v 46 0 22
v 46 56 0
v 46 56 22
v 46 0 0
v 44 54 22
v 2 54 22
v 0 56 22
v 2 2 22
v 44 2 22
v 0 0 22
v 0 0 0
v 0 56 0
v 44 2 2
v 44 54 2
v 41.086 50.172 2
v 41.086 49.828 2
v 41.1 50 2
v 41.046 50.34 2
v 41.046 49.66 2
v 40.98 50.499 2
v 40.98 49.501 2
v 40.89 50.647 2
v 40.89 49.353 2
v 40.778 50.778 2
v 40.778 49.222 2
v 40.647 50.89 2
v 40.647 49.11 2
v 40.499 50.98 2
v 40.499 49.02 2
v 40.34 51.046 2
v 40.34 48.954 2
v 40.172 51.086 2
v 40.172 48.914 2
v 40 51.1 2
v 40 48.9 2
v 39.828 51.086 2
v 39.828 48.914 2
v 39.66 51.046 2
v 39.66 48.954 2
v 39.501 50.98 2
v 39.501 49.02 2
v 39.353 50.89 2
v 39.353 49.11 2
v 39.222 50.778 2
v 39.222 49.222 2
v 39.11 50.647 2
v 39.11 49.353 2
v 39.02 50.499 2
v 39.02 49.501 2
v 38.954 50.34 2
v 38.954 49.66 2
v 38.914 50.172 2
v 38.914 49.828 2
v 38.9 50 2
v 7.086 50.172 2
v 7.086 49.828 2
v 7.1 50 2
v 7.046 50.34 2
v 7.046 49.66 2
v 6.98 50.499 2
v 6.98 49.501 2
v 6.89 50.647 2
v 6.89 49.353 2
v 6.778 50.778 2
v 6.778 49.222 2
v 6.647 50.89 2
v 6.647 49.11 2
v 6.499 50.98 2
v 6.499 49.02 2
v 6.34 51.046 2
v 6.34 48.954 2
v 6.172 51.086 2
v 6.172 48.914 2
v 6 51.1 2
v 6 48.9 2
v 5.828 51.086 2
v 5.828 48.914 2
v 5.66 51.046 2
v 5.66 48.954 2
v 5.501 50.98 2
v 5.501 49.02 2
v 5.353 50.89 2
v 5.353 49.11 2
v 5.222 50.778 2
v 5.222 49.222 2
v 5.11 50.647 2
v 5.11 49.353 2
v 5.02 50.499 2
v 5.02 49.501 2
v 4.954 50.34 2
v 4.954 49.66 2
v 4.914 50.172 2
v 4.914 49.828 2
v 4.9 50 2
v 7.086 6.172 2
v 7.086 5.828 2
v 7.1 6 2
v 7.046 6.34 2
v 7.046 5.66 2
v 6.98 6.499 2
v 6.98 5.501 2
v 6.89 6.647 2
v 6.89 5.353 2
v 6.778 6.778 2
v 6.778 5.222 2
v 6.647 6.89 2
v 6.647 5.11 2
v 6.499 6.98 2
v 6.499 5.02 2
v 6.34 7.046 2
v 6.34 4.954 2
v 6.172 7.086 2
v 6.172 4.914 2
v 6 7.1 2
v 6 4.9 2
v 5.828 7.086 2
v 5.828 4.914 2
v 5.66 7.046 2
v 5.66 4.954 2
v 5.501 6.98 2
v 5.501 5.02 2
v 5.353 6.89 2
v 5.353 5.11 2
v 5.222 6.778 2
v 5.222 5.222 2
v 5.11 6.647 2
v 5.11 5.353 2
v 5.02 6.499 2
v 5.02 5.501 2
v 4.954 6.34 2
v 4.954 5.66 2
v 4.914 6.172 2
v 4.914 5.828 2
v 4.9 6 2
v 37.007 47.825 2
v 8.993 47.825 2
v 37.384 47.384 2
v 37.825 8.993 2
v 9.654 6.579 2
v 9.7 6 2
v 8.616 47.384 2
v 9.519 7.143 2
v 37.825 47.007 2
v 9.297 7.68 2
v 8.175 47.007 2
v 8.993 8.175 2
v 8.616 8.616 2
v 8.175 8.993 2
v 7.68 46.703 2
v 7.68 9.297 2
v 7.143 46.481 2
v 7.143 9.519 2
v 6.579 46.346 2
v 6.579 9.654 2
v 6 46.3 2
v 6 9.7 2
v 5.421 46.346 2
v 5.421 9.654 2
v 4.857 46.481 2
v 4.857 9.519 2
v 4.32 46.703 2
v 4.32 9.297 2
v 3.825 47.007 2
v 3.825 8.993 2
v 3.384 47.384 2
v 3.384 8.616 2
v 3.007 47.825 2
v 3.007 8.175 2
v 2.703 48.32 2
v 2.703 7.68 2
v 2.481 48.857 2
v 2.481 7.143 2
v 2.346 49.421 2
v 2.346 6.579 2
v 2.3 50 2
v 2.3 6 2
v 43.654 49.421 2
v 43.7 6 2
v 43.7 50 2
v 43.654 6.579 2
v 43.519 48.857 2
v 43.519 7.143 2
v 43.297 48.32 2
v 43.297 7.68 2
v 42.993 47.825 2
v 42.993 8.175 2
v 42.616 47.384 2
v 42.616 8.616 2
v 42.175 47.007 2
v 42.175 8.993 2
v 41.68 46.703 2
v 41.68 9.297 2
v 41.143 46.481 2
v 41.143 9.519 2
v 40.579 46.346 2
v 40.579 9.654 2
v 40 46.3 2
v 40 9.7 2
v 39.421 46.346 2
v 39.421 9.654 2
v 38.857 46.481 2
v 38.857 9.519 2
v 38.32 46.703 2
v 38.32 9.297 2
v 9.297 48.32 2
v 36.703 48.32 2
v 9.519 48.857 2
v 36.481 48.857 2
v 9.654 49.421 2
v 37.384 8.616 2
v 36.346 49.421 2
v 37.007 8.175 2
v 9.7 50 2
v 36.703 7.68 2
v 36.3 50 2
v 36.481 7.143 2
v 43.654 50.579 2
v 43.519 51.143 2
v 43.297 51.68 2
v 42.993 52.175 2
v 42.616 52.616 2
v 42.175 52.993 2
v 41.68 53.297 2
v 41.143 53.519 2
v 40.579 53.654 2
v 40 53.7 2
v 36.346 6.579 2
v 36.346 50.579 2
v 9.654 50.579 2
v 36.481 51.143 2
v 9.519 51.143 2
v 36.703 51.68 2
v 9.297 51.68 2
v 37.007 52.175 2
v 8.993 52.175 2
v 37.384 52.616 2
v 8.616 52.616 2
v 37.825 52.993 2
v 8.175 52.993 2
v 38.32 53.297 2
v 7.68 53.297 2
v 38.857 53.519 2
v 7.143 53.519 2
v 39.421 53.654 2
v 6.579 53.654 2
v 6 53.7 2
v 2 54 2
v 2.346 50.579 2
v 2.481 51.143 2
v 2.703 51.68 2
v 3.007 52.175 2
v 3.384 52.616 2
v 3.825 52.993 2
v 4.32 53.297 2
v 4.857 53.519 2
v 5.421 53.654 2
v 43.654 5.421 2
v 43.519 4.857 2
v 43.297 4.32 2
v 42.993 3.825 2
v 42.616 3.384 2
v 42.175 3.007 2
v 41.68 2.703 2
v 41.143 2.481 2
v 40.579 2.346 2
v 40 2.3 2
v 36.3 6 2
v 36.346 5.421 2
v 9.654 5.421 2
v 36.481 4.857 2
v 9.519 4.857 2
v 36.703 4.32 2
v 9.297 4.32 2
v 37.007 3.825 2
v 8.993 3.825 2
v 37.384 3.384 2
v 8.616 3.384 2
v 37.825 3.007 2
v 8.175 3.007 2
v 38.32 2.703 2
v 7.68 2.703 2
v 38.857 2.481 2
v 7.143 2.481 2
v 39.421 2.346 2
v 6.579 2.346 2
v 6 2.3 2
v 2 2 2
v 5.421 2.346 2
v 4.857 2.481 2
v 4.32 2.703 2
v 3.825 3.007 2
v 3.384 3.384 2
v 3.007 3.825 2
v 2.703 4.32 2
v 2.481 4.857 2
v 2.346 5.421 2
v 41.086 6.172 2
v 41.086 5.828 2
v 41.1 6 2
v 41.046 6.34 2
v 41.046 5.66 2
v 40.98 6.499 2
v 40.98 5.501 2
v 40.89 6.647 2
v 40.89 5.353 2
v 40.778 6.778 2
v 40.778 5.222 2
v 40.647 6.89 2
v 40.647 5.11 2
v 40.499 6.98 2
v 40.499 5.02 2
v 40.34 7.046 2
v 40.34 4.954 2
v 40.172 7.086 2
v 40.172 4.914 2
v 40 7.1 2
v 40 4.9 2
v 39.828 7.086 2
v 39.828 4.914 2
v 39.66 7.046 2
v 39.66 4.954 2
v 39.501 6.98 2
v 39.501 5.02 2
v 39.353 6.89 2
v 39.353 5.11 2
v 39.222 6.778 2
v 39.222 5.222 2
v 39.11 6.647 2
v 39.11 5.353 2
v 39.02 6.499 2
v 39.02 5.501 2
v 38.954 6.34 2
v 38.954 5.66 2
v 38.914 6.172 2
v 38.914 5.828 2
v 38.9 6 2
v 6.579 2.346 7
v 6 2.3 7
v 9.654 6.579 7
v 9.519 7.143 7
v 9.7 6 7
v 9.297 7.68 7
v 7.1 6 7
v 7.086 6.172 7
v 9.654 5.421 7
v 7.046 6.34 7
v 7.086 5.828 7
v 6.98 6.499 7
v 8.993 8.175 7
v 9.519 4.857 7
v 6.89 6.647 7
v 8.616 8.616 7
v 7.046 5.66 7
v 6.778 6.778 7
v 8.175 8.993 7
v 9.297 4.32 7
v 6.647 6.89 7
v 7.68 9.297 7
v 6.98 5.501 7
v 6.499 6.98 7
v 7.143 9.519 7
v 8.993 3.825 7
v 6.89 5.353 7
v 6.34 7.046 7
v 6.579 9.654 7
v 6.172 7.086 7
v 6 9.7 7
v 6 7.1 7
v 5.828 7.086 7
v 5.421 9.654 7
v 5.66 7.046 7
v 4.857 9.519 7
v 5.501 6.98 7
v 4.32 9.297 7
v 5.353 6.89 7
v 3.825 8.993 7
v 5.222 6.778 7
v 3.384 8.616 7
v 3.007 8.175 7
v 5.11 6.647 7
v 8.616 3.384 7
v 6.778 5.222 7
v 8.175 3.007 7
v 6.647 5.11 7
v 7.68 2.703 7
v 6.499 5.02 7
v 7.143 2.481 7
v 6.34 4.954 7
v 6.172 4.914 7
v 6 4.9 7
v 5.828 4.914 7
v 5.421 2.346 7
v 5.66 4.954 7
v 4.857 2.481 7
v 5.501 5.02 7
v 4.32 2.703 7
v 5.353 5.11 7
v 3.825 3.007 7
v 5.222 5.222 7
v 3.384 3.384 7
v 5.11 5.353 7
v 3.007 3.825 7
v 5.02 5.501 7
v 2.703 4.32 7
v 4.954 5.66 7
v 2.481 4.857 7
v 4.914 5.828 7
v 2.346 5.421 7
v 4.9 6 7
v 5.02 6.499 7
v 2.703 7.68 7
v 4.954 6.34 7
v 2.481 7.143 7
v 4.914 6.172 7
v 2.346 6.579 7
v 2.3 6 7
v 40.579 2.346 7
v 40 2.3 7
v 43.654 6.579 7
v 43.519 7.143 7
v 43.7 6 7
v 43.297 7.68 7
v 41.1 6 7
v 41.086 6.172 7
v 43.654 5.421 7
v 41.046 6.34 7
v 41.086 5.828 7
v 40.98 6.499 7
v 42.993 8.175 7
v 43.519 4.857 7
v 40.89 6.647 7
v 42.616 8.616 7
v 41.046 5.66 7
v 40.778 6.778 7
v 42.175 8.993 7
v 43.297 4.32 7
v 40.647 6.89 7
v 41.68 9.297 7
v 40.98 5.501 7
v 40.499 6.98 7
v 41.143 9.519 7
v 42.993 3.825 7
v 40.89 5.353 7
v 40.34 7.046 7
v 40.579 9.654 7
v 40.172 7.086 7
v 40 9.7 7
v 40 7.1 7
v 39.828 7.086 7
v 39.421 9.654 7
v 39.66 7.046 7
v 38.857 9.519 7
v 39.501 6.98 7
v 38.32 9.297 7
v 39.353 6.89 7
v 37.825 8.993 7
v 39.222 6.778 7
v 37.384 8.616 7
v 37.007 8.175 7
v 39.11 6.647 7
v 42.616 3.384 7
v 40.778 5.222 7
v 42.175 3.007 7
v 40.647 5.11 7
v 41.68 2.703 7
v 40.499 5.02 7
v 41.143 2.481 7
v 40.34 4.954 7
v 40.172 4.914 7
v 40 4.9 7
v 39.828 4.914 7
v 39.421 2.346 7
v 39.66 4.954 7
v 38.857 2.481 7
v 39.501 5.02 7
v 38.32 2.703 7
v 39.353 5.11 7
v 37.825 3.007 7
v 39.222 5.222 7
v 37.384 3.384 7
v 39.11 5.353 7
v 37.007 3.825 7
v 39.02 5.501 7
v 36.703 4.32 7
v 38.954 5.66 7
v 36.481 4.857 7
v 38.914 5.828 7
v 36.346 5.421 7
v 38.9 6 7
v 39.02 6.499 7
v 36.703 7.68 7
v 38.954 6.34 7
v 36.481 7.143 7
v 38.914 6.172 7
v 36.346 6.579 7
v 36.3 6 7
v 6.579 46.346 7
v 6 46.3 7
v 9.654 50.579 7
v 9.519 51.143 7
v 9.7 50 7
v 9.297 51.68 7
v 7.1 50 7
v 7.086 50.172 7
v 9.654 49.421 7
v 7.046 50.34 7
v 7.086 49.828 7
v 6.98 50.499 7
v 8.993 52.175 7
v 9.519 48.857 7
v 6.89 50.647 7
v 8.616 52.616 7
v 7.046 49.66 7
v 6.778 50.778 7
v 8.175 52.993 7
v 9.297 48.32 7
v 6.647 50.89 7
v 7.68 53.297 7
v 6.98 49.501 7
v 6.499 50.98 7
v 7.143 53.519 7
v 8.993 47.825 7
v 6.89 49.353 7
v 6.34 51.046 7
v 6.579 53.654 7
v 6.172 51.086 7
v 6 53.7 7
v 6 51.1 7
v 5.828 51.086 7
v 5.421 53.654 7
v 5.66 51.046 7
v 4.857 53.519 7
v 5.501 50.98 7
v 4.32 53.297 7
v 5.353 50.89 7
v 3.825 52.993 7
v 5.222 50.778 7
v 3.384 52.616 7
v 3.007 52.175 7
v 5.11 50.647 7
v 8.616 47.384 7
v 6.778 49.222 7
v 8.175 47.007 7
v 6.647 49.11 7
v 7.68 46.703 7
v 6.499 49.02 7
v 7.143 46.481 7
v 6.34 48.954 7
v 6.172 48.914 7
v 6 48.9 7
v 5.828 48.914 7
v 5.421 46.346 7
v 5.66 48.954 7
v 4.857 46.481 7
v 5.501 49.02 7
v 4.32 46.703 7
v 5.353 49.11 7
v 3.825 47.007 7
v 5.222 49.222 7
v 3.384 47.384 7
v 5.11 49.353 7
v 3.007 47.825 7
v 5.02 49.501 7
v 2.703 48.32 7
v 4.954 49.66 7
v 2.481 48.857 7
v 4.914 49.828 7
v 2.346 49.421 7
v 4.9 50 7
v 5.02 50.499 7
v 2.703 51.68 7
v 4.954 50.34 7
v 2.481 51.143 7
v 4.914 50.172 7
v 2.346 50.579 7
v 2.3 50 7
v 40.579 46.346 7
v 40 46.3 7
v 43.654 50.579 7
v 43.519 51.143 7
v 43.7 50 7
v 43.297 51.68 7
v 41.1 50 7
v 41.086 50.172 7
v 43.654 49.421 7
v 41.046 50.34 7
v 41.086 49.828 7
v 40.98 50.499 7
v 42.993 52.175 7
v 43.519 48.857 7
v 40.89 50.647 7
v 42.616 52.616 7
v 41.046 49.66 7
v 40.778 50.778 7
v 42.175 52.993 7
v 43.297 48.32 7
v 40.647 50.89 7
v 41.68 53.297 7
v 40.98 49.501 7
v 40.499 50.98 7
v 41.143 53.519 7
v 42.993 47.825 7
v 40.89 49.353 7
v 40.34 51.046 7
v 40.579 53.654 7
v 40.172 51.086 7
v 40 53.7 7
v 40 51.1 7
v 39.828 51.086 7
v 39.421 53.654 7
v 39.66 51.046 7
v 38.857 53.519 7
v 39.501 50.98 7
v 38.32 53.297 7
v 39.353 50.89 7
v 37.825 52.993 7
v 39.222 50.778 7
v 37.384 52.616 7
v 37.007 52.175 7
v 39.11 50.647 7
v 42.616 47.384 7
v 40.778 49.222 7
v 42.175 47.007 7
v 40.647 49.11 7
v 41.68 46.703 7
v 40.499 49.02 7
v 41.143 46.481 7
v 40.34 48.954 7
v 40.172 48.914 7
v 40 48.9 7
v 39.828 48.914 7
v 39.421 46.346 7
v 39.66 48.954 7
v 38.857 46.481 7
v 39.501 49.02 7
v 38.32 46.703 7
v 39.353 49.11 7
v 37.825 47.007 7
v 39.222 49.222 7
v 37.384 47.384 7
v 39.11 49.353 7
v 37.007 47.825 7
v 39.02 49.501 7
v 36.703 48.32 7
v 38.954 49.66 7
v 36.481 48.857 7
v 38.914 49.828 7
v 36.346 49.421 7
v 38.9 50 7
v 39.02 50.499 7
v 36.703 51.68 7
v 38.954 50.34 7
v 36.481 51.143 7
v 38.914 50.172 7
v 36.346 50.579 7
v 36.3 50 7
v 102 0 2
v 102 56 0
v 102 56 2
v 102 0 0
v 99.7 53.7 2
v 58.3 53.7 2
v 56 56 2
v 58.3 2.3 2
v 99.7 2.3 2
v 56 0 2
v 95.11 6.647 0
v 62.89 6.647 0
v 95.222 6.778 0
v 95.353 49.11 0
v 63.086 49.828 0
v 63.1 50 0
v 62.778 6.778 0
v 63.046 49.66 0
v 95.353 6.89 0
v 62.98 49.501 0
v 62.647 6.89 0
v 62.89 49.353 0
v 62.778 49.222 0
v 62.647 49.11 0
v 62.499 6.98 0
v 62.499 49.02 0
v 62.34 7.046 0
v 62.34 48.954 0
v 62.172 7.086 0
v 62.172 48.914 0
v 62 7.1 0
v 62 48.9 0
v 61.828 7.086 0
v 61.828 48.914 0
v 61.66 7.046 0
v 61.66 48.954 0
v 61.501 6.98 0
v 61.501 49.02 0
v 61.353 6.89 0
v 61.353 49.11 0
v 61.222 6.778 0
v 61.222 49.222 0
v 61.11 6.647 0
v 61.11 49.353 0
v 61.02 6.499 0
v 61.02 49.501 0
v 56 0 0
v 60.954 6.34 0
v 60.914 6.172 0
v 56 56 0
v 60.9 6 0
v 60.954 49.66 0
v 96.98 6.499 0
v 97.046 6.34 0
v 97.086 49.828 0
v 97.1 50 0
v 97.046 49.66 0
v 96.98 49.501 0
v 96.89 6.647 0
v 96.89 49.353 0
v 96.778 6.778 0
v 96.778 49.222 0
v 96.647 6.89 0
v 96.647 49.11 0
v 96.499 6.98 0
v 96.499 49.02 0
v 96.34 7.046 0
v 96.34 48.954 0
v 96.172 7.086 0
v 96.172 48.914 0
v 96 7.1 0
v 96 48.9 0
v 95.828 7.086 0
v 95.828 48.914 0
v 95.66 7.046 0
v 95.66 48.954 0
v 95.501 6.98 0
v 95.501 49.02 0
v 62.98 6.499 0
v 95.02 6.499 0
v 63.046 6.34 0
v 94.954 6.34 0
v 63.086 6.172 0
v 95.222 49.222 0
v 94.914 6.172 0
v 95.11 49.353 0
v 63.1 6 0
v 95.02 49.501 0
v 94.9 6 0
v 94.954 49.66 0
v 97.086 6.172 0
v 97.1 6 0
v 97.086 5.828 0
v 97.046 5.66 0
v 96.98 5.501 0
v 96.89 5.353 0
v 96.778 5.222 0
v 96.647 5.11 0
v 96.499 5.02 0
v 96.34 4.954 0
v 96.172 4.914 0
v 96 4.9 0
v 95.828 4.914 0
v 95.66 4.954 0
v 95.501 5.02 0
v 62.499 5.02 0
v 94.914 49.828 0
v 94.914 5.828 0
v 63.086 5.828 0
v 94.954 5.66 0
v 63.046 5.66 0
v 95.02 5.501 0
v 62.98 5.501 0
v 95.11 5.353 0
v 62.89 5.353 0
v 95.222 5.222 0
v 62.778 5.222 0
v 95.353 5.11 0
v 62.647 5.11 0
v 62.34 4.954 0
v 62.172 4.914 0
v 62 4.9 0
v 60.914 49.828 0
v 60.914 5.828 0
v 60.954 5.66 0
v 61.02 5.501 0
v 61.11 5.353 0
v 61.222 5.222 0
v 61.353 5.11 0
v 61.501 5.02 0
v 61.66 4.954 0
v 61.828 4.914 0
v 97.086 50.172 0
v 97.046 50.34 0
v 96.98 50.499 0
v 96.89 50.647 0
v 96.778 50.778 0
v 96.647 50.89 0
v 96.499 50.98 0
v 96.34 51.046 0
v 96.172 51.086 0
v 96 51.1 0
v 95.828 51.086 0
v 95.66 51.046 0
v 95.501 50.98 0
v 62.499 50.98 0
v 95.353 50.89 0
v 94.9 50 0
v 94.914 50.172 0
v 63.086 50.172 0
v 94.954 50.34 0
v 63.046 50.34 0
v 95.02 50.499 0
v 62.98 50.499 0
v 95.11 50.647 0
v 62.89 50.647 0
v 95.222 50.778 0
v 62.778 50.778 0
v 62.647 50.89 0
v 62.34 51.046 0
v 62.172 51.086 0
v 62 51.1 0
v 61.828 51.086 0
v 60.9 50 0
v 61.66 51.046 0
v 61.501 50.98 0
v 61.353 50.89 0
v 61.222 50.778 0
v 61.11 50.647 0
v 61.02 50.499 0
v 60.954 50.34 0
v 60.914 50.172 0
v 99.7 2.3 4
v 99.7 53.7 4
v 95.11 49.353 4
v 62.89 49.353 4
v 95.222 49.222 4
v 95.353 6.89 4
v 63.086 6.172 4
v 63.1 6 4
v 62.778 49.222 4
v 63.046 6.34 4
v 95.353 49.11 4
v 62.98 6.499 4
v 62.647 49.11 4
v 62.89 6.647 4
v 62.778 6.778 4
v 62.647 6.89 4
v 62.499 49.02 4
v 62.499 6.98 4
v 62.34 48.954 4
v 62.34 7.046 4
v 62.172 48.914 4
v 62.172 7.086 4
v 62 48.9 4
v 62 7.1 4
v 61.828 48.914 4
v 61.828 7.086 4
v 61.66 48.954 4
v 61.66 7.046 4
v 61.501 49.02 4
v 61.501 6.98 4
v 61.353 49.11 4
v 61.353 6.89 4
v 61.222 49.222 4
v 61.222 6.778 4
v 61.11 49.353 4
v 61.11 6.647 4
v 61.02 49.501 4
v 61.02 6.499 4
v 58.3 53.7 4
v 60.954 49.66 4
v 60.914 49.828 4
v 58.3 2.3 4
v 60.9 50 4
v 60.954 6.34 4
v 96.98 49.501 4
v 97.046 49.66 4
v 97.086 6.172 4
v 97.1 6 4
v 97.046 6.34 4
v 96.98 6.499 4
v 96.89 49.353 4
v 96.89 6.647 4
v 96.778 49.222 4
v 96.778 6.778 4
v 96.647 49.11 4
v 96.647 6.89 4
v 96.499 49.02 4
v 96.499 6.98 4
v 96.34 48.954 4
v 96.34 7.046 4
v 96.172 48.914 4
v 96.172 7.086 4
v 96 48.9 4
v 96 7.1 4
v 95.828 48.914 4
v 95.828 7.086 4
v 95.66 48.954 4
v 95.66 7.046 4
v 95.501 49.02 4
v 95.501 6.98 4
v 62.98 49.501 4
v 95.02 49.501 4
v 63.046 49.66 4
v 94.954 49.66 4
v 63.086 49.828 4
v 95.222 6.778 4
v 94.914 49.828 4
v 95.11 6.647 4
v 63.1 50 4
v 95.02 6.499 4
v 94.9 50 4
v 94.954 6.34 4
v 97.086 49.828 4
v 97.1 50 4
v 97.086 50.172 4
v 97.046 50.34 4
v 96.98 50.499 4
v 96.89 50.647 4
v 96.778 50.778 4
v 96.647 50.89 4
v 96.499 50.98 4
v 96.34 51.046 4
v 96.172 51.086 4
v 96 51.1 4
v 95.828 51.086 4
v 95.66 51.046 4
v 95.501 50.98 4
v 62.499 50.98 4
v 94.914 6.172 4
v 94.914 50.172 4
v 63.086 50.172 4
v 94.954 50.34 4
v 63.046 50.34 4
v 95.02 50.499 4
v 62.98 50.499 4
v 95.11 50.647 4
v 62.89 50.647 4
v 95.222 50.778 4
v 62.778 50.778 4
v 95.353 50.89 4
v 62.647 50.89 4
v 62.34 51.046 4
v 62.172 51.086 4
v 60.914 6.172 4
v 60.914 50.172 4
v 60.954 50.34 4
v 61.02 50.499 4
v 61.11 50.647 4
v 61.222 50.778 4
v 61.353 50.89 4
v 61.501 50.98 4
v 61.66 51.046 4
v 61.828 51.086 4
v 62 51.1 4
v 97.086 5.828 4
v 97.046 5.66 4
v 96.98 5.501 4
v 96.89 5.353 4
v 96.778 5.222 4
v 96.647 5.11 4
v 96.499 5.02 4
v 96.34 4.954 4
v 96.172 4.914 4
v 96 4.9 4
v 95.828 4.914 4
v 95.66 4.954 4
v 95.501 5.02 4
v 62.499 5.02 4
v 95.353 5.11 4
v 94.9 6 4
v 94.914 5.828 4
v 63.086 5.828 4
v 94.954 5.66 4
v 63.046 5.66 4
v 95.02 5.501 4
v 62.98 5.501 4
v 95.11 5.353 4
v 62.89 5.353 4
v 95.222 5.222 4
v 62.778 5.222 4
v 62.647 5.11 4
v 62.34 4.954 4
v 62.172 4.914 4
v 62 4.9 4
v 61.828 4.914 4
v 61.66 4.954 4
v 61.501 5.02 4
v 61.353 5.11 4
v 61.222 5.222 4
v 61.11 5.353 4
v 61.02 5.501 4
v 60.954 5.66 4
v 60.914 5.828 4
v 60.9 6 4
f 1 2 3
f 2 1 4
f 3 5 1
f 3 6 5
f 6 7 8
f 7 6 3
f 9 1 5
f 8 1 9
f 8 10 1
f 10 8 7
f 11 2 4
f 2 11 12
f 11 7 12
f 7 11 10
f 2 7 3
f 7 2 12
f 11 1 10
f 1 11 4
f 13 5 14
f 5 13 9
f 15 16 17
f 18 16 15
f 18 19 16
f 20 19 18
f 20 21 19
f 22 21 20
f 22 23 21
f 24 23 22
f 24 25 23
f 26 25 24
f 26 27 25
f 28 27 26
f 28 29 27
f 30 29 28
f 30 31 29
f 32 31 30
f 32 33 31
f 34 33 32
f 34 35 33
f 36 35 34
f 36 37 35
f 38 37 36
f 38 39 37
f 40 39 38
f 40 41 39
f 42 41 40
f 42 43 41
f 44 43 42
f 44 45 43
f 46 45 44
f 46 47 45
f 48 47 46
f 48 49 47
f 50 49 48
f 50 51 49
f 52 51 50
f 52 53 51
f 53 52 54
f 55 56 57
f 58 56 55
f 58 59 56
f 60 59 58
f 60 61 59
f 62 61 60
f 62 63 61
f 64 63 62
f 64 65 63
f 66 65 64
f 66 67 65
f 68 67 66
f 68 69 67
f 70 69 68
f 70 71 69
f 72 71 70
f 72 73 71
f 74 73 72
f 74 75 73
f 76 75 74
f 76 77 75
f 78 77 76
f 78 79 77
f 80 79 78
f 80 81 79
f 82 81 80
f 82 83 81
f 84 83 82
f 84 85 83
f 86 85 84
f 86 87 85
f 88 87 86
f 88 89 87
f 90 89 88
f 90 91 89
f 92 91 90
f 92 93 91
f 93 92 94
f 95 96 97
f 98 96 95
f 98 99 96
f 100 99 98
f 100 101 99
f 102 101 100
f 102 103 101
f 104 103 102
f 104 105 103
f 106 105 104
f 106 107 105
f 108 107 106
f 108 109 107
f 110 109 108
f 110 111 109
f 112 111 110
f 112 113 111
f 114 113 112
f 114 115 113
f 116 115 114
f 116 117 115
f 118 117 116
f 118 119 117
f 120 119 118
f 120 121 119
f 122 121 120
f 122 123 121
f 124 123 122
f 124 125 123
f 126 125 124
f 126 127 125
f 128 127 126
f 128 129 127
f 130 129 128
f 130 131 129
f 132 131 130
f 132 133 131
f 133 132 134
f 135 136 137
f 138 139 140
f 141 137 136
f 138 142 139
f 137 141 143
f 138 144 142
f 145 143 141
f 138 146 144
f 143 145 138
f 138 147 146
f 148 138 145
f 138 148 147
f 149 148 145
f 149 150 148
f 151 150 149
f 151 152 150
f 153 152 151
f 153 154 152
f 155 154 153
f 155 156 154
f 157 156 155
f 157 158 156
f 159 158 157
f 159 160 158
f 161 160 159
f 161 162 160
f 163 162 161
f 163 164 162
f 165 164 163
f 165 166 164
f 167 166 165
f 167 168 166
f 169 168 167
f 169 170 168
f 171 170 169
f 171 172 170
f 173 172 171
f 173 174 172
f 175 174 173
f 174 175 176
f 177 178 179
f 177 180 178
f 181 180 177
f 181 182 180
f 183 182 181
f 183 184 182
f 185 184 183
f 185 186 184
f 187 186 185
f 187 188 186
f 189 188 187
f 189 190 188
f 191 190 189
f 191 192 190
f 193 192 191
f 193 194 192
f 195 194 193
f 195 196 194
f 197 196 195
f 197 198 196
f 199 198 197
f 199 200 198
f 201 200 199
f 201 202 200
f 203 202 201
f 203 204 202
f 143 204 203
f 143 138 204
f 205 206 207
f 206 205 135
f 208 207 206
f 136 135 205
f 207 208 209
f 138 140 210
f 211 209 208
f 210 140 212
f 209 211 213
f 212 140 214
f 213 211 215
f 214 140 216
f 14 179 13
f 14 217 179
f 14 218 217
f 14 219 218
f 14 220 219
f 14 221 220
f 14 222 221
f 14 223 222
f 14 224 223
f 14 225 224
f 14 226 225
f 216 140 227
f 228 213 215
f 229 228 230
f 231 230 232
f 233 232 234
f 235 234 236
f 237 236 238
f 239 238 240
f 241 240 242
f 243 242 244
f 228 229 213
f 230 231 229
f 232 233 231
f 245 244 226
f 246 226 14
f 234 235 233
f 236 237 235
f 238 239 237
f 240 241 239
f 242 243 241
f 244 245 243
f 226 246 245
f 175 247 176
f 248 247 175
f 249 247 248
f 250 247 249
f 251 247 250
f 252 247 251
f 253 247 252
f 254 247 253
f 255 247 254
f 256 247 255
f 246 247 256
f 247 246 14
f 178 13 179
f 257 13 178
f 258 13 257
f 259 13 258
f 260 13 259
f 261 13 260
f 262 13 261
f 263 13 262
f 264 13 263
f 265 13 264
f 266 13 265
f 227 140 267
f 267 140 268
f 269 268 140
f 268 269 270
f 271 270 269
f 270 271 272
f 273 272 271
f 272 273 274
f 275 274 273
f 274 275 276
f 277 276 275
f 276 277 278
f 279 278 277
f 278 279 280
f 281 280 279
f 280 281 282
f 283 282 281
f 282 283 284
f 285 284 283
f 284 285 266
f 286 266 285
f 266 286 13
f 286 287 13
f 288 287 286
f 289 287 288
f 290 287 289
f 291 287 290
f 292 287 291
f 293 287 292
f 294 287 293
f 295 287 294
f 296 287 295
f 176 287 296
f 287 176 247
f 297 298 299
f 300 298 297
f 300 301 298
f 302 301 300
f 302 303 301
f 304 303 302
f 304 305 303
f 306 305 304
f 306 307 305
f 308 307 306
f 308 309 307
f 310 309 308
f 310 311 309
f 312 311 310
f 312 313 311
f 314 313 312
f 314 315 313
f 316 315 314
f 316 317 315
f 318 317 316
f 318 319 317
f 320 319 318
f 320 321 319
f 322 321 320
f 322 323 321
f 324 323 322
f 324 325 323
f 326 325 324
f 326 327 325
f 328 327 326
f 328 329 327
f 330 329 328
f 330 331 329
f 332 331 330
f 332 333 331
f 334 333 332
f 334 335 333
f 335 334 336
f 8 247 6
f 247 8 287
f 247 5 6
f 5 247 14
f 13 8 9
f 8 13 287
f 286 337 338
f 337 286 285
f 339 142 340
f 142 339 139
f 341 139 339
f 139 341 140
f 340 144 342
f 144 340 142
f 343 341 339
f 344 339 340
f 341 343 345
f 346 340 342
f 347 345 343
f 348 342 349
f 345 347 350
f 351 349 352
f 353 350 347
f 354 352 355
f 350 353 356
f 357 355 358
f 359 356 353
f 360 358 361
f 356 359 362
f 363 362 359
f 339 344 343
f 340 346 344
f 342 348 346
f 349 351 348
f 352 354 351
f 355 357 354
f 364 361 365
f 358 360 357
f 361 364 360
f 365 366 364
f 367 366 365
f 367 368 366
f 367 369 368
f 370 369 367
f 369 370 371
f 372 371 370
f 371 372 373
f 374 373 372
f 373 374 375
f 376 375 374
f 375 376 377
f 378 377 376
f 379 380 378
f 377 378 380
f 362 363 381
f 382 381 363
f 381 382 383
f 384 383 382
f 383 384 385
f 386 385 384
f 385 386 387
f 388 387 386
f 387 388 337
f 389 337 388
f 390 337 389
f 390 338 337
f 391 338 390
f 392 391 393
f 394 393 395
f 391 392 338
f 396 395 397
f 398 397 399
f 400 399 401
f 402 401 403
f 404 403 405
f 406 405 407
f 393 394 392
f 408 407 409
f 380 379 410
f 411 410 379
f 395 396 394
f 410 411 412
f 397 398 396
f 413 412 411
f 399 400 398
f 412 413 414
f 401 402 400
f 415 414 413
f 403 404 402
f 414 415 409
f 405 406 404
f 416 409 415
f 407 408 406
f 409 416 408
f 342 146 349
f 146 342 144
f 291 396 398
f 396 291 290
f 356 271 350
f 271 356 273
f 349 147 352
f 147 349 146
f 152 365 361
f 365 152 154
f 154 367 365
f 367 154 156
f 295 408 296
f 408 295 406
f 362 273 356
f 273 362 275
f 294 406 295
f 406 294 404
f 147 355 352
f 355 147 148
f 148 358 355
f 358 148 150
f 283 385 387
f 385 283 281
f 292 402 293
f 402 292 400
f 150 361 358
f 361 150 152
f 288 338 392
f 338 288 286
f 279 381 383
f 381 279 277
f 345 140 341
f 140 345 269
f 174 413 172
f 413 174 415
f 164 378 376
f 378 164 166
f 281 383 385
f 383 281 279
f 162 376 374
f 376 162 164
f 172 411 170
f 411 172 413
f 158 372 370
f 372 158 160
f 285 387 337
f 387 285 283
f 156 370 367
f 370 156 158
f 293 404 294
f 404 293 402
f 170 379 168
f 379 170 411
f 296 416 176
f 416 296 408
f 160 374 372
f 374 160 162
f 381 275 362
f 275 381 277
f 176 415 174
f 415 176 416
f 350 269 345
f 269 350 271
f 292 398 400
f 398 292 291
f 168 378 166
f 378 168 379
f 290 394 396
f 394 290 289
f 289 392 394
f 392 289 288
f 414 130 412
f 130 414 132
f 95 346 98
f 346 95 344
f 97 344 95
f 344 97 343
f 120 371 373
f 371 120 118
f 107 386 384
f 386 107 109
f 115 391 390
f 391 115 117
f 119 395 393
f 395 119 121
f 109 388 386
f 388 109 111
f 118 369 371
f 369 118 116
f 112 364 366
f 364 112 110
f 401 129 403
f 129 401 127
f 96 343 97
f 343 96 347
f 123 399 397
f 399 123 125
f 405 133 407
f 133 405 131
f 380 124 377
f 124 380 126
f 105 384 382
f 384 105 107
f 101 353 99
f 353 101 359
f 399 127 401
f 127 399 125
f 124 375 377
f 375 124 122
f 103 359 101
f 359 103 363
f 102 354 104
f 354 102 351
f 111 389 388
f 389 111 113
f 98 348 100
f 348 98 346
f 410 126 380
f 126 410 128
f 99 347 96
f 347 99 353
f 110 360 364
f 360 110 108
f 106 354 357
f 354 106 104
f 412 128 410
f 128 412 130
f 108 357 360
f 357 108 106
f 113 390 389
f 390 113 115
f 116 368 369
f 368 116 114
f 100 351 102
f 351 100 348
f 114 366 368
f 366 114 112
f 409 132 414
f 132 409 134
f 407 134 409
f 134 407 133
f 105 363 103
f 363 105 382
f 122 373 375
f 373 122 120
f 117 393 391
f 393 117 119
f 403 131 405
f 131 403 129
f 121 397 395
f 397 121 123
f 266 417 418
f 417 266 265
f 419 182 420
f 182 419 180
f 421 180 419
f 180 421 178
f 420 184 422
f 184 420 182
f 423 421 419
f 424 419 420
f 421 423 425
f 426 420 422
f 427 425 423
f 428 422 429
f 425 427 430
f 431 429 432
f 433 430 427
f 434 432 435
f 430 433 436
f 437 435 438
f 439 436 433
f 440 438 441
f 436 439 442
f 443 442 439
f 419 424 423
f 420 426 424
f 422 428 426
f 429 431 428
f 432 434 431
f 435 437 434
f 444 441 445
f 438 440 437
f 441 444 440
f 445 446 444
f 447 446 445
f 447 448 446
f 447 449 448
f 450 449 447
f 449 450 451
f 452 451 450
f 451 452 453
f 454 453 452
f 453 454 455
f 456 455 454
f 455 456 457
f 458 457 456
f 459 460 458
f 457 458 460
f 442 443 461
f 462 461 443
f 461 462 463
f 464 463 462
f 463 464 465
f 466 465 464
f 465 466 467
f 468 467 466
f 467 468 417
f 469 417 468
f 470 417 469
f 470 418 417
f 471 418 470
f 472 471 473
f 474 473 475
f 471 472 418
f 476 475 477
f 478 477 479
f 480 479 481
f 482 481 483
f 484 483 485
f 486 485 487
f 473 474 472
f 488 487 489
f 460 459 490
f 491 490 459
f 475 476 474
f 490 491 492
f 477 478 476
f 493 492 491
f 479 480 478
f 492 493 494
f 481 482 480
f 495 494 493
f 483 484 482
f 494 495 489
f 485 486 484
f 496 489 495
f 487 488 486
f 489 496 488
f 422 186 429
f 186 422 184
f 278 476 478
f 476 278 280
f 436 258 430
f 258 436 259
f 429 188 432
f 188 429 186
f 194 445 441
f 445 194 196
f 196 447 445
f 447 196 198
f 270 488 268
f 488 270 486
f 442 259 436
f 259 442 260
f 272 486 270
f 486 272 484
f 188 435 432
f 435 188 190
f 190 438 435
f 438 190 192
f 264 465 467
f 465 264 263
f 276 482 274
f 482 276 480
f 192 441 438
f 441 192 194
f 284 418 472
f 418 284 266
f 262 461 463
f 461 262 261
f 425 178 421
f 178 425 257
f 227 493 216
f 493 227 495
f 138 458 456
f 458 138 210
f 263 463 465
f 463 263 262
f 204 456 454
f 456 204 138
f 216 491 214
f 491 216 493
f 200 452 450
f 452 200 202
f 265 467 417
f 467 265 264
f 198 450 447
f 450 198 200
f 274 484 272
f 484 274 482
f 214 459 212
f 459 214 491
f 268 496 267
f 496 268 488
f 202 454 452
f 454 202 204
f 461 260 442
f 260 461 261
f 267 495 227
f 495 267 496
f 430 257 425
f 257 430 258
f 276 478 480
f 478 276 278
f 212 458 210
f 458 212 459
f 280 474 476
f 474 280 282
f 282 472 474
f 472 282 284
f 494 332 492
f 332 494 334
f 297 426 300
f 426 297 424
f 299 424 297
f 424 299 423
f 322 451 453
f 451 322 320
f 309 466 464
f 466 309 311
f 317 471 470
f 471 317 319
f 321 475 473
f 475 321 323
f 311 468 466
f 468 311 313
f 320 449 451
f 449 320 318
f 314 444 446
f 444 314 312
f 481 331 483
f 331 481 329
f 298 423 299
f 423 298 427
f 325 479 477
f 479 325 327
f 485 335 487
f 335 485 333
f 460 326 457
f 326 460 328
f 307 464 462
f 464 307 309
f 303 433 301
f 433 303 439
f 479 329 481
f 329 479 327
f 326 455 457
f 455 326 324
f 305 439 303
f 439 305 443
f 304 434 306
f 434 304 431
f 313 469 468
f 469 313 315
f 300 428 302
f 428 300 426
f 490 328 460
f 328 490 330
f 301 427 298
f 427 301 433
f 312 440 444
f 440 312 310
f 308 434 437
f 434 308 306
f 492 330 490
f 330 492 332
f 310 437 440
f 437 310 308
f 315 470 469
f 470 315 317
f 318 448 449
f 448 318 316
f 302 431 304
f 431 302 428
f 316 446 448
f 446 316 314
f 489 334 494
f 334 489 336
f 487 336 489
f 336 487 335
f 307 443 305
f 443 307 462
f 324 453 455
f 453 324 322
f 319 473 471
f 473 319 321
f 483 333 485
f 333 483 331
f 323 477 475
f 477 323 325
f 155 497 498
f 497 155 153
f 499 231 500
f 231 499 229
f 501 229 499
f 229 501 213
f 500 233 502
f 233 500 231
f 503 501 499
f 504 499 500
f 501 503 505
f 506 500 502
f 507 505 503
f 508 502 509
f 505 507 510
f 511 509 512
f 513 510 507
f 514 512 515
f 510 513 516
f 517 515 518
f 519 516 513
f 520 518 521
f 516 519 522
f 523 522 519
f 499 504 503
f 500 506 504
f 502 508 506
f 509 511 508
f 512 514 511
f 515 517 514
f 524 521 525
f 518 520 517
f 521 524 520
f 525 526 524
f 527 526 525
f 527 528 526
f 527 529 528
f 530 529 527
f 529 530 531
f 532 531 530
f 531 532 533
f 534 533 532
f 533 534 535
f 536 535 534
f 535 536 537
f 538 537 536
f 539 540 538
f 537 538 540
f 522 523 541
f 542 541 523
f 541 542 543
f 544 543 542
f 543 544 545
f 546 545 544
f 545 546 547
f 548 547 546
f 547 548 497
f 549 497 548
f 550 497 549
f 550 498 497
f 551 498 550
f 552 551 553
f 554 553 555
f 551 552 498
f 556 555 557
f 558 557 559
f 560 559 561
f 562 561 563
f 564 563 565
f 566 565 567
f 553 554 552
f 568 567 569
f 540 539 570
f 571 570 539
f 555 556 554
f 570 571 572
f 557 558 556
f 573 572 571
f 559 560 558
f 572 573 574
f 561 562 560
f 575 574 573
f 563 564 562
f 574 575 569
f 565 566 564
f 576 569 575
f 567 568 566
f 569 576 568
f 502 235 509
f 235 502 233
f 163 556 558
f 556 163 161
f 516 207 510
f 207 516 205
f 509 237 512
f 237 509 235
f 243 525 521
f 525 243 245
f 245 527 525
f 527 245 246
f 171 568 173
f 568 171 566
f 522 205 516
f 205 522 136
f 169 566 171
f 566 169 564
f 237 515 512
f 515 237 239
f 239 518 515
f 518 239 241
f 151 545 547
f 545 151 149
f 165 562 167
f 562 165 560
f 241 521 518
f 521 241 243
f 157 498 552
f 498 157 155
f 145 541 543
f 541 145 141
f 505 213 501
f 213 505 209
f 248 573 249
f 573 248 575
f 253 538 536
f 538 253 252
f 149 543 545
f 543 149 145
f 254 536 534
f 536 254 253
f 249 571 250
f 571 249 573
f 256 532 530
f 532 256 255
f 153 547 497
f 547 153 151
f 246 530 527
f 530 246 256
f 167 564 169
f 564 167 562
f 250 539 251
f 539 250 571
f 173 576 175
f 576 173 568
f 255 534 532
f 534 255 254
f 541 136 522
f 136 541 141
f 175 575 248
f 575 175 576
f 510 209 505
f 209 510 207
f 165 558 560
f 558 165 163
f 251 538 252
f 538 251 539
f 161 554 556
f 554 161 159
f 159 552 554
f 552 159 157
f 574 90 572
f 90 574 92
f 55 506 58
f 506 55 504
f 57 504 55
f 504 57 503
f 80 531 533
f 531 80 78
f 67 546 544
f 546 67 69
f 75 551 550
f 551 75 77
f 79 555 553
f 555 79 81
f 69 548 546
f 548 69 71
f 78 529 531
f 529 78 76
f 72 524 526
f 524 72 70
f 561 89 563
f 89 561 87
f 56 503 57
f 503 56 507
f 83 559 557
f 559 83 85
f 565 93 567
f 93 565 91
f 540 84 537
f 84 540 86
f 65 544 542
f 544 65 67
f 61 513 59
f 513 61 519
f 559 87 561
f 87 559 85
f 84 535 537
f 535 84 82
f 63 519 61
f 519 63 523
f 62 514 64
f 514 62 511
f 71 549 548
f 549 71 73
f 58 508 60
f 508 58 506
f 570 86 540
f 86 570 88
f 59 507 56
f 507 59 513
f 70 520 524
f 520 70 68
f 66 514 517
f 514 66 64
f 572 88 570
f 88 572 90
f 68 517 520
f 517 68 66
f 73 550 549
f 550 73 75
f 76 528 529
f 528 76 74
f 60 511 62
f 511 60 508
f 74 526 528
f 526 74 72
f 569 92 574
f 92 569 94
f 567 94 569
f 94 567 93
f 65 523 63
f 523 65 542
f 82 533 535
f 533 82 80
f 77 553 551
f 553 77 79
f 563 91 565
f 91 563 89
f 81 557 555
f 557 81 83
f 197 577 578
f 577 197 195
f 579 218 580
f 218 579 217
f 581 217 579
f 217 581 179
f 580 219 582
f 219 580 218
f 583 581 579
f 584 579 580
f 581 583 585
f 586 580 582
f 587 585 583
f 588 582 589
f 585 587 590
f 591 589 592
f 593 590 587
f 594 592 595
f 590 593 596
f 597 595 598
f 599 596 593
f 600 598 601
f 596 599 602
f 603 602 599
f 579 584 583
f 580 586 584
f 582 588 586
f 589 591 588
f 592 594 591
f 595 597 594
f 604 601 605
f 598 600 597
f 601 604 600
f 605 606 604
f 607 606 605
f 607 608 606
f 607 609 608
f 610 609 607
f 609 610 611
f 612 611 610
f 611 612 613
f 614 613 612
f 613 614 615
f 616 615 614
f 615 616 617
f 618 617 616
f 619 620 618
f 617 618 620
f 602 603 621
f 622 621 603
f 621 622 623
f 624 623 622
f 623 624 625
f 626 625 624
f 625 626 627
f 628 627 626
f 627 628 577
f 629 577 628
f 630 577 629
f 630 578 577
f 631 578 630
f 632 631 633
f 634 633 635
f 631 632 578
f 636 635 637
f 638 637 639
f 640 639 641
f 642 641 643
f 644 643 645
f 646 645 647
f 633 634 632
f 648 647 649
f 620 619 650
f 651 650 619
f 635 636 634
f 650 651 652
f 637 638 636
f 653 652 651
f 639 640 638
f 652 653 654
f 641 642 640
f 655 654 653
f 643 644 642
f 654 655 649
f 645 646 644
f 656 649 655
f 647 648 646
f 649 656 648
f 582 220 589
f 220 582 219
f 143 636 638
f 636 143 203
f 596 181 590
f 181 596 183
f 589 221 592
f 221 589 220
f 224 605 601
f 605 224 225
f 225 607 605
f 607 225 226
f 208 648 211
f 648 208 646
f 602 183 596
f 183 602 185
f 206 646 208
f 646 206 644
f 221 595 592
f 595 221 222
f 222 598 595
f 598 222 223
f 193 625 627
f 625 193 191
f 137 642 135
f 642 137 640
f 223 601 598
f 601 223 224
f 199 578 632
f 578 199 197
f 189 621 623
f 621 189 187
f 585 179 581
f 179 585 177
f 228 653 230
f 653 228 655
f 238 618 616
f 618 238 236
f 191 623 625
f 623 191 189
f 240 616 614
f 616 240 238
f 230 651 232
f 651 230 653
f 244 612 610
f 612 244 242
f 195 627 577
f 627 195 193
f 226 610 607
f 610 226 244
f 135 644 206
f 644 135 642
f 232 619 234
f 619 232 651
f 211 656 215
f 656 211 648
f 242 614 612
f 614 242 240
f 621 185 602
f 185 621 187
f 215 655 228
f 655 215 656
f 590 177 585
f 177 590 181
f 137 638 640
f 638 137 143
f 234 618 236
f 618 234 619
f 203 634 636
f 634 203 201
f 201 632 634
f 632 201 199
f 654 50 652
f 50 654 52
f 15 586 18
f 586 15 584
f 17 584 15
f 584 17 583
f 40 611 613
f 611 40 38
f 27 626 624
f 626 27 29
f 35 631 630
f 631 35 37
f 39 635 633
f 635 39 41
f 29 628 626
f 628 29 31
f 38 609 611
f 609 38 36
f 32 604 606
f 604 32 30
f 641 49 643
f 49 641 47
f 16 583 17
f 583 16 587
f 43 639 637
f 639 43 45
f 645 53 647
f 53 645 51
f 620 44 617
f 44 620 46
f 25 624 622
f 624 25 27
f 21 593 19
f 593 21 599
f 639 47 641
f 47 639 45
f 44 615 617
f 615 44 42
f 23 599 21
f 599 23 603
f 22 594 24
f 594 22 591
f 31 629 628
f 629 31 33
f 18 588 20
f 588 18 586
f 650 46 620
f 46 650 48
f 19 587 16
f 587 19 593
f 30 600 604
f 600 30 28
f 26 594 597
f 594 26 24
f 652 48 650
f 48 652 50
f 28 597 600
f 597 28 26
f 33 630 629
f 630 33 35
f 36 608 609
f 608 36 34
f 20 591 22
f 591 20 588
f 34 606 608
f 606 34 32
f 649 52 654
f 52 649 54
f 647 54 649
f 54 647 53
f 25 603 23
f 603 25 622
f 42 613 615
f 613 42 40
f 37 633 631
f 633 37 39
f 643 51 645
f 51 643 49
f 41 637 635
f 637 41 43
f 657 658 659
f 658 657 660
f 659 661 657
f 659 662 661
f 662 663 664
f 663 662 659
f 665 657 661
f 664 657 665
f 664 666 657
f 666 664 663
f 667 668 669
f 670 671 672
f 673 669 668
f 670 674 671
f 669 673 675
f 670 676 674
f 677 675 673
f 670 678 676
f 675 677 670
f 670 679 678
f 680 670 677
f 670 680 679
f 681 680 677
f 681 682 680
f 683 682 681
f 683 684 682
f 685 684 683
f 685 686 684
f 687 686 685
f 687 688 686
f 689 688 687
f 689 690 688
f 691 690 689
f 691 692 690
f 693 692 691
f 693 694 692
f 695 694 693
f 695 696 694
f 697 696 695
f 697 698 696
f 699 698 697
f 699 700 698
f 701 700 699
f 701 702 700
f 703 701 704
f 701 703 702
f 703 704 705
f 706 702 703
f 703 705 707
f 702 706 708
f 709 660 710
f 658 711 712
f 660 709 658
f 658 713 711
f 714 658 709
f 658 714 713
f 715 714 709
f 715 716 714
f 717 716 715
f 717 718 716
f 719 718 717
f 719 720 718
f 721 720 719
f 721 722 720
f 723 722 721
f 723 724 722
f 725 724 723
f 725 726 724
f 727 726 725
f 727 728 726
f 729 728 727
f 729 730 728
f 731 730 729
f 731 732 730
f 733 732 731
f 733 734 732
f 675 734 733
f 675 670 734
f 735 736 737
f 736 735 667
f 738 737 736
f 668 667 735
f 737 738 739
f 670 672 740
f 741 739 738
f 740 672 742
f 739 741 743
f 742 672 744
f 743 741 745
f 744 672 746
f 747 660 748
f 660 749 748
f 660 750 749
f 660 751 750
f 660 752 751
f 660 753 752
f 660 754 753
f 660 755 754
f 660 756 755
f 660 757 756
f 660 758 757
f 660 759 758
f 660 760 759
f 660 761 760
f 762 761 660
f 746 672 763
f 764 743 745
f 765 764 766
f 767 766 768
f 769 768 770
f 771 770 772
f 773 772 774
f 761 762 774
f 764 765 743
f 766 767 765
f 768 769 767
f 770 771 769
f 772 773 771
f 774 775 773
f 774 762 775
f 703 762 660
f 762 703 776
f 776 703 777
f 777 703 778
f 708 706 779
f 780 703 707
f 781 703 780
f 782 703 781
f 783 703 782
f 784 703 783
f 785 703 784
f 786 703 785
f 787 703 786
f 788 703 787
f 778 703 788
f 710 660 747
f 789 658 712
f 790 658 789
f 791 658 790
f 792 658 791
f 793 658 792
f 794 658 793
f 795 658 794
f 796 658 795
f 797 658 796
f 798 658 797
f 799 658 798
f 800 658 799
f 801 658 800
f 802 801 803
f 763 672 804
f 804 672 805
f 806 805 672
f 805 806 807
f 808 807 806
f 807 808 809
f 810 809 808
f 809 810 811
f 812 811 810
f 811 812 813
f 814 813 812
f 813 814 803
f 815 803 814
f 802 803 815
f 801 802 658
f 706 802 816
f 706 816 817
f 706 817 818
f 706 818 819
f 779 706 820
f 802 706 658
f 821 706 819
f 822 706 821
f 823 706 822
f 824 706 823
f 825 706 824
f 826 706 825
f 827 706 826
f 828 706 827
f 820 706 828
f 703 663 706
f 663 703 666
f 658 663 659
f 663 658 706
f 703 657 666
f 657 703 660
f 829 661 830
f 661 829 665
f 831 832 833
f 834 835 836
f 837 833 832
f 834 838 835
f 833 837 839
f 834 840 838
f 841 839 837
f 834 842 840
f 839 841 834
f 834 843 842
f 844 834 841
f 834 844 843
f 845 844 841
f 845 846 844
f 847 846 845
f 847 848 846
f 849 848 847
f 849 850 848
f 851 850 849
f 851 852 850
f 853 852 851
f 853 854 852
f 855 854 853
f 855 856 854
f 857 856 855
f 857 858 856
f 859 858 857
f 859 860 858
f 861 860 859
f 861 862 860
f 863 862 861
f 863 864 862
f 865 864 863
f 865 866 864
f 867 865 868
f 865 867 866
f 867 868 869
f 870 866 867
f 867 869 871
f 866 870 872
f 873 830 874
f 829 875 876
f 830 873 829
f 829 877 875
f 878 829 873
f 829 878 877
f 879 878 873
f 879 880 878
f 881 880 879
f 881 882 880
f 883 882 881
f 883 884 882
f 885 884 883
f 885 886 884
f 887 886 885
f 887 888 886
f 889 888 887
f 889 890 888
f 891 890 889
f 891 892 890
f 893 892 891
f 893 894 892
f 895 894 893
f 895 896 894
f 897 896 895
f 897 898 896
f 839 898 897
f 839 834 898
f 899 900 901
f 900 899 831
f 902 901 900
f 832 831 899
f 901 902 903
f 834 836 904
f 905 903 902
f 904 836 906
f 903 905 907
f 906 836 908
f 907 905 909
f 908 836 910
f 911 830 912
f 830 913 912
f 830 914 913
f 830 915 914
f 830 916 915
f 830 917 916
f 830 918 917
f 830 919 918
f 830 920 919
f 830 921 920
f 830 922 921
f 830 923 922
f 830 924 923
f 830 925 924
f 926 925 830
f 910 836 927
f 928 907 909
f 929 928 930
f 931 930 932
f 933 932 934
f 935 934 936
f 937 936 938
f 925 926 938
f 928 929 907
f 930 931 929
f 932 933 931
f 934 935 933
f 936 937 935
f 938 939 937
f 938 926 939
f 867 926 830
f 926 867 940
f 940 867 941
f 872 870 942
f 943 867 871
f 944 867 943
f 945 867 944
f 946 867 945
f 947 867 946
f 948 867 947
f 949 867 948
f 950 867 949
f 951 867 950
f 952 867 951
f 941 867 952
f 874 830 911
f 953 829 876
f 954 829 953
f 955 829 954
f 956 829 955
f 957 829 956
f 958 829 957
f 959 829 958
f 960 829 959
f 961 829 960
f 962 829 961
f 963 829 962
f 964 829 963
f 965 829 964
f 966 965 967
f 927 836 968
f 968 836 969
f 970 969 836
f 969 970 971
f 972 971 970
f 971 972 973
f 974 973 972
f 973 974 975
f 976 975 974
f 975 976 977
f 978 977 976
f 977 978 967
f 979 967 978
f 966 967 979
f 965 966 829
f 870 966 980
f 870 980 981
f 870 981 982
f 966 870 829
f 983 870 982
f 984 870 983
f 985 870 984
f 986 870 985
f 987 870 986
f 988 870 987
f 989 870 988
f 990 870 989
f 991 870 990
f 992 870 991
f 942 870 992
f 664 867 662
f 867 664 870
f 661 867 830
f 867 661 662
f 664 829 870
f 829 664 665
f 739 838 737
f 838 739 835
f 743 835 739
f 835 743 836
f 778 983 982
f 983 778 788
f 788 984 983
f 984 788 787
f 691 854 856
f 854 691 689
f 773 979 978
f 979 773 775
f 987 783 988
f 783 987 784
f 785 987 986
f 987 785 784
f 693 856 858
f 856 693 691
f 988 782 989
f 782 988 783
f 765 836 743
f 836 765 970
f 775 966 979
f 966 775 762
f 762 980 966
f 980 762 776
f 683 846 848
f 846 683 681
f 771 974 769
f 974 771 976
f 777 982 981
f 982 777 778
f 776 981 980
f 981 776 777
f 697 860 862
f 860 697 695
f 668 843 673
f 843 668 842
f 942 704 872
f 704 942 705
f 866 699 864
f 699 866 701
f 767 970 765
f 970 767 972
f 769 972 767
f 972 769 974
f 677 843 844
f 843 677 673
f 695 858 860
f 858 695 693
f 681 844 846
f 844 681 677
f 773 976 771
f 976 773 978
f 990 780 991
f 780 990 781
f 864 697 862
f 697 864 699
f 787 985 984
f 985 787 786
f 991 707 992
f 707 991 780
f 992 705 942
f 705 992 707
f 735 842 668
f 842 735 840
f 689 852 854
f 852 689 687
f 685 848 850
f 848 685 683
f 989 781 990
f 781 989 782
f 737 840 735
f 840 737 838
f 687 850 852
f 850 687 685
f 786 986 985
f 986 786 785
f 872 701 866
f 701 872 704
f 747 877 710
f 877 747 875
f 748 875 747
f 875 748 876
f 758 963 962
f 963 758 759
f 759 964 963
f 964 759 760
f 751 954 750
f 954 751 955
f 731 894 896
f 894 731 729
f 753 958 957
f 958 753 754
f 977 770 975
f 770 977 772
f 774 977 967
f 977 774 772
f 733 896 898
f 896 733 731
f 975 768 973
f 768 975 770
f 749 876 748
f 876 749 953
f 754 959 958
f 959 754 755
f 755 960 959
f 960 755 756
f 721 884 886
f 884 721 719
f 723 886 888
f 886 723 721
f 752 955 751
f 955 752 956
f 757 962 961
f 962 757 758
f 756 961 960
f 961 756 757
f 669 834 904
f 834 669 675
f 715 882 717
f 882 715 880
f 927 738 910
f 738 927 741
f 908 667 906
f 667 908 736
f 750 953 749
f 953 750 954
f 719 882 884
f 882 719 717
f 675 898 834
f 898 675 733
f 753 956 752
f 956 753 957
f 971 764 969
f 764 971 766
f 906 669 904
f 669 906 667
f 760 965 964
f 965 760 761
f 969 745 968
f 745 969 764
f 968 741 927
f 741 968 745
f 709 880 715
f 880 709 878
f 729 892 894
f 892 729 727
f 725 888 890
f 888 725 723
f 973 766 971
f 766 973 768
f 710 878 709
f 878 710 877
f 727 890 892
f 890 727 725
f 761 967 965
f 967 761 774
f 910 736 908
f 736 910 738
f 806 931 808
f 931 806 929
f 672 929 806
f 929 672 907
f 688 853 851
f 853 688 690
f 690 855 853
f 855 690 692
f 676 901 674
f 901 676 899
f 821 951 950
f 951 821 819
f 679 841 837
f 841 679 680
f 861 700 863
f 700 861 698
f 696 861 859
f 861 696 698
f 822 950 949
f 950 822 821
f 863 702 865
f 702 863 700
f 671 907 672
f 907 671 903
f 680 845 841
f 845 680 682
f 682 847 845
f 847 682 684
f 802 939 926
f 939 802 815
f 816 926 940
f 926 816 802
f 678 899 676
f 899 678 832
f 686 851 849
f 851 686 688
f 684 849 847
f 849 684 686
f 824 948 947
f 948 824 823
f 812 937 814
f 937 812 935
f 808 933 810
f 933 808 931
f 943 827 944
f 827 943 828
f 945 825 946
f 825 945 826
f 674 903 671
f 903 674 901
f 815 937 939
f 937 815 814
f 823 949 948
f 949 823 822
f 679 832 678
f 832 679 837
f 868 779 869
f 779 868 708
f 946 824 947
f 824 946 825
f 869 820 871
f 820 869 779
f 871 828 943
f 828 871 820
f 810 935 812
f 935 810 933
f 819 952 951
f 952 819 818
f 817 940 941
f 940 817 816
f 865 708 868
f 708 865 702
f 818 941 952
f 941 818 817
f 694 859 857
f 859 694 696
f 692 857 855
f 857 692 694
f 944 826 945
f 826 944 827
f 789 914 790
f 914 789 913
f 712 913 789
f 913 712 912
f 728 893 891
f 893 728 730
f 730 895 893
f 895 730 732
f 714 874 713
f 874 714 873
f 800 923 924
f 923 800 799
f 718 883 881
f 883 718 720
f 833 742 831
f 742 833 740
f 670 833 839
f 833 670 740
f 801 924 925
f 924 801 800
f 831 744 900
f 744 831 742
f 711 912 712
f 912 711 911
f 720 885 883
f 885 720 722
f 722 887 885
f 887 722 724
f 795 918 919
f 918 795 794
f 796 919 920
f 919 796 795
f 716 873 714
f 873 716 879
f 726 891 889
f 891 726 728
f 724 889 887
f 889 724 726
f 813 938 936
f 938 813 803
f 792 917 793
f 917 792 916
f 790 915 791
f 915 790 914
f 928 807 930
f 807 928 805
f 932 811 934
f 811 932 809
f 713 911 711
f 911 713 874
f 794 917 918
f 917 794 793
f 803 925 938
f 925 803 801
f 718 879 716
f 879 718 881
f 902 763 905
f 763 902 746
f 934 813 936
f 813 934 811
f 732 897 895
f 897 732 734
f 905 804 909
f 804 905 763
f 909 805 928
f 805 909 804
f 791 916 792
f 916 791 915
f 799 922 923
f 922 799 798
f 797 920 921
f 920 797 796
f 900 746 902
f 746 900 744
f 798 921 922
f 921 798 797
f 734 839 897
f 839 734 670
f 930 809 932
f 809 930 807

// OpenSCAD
// Parametric PCB Enclosure: test_enclosure
// Generated automatically by Odysseus CAD Maker

$fn = 40;

pcb_w = 40.0;
pcb_l = 50.0;
box_h = 20.0;
wall = 2.0;
standoff_h = 5.0;
screw_d = 2.2;

outer_w = pcb_w + 2 * (wall + 1);
outer_l = pcb_l + 2 * (wall + 1);
outer_h = box_h + wall;

module standoff(x, y) {
    translate([x, y, wall]) {
        difference() {
            cylinder(r=screw_d + 1.5, h=standoff_h);
            cylinder(r=screw_d / 2, h=standoff_h + 1);
        }
    }
}

module enclosure_base() {
    difference() {
        // Outer body
        cube([outer_w, outer_l, outer_h]);
        // Inner cavity
        translate([wall, wall, wall])
            cube([outer_w - 2 * wall, outer_l - 2 * wall, outer_h]);
    }

    // PCB Standoffs in 4 corners
    standoff(wall + 4, wall + 4);
    standoff(outer_w - wall - 4, wall + 4);
    standoff(wall + 4, outer_l - wall - 4);
    standoff(outer_w - wall - 4, outer_l - wall - 4);
}

module enclosure_lid() {
    translate([outer_w + 10, 0, 0]) {
        difference() {
            union() {
                cube([outer_w, outer_l, wall]);
                translate([wall + 0.3, wall + 0.3, wall])
                    cube([outer_w - 2 * wall - 0.6, outer_l - 2 * wall - 0.6, 2]);
            }
            // Screw holes
            translate([wall + 4, wall + 4, -1]) cylinder(r=screw_d / 2, h=wall + 4);
            translate([outer_w - wall - 4, wall + 4, -1]) cylinder(r=screw_d / 2, h=wall + 4);
            translate([wall + 4, outer_l - wall - 4, -1]) cylinder(r=screw_d / 2, h=wall + 4);
            translate([outer_w - wall - 4, outer_l - wall - 4, -1]) cylinder(r=screw_d / 2, h=wall + 4);
        }
    }
}

enclosure_base();
enclosure_lid();
